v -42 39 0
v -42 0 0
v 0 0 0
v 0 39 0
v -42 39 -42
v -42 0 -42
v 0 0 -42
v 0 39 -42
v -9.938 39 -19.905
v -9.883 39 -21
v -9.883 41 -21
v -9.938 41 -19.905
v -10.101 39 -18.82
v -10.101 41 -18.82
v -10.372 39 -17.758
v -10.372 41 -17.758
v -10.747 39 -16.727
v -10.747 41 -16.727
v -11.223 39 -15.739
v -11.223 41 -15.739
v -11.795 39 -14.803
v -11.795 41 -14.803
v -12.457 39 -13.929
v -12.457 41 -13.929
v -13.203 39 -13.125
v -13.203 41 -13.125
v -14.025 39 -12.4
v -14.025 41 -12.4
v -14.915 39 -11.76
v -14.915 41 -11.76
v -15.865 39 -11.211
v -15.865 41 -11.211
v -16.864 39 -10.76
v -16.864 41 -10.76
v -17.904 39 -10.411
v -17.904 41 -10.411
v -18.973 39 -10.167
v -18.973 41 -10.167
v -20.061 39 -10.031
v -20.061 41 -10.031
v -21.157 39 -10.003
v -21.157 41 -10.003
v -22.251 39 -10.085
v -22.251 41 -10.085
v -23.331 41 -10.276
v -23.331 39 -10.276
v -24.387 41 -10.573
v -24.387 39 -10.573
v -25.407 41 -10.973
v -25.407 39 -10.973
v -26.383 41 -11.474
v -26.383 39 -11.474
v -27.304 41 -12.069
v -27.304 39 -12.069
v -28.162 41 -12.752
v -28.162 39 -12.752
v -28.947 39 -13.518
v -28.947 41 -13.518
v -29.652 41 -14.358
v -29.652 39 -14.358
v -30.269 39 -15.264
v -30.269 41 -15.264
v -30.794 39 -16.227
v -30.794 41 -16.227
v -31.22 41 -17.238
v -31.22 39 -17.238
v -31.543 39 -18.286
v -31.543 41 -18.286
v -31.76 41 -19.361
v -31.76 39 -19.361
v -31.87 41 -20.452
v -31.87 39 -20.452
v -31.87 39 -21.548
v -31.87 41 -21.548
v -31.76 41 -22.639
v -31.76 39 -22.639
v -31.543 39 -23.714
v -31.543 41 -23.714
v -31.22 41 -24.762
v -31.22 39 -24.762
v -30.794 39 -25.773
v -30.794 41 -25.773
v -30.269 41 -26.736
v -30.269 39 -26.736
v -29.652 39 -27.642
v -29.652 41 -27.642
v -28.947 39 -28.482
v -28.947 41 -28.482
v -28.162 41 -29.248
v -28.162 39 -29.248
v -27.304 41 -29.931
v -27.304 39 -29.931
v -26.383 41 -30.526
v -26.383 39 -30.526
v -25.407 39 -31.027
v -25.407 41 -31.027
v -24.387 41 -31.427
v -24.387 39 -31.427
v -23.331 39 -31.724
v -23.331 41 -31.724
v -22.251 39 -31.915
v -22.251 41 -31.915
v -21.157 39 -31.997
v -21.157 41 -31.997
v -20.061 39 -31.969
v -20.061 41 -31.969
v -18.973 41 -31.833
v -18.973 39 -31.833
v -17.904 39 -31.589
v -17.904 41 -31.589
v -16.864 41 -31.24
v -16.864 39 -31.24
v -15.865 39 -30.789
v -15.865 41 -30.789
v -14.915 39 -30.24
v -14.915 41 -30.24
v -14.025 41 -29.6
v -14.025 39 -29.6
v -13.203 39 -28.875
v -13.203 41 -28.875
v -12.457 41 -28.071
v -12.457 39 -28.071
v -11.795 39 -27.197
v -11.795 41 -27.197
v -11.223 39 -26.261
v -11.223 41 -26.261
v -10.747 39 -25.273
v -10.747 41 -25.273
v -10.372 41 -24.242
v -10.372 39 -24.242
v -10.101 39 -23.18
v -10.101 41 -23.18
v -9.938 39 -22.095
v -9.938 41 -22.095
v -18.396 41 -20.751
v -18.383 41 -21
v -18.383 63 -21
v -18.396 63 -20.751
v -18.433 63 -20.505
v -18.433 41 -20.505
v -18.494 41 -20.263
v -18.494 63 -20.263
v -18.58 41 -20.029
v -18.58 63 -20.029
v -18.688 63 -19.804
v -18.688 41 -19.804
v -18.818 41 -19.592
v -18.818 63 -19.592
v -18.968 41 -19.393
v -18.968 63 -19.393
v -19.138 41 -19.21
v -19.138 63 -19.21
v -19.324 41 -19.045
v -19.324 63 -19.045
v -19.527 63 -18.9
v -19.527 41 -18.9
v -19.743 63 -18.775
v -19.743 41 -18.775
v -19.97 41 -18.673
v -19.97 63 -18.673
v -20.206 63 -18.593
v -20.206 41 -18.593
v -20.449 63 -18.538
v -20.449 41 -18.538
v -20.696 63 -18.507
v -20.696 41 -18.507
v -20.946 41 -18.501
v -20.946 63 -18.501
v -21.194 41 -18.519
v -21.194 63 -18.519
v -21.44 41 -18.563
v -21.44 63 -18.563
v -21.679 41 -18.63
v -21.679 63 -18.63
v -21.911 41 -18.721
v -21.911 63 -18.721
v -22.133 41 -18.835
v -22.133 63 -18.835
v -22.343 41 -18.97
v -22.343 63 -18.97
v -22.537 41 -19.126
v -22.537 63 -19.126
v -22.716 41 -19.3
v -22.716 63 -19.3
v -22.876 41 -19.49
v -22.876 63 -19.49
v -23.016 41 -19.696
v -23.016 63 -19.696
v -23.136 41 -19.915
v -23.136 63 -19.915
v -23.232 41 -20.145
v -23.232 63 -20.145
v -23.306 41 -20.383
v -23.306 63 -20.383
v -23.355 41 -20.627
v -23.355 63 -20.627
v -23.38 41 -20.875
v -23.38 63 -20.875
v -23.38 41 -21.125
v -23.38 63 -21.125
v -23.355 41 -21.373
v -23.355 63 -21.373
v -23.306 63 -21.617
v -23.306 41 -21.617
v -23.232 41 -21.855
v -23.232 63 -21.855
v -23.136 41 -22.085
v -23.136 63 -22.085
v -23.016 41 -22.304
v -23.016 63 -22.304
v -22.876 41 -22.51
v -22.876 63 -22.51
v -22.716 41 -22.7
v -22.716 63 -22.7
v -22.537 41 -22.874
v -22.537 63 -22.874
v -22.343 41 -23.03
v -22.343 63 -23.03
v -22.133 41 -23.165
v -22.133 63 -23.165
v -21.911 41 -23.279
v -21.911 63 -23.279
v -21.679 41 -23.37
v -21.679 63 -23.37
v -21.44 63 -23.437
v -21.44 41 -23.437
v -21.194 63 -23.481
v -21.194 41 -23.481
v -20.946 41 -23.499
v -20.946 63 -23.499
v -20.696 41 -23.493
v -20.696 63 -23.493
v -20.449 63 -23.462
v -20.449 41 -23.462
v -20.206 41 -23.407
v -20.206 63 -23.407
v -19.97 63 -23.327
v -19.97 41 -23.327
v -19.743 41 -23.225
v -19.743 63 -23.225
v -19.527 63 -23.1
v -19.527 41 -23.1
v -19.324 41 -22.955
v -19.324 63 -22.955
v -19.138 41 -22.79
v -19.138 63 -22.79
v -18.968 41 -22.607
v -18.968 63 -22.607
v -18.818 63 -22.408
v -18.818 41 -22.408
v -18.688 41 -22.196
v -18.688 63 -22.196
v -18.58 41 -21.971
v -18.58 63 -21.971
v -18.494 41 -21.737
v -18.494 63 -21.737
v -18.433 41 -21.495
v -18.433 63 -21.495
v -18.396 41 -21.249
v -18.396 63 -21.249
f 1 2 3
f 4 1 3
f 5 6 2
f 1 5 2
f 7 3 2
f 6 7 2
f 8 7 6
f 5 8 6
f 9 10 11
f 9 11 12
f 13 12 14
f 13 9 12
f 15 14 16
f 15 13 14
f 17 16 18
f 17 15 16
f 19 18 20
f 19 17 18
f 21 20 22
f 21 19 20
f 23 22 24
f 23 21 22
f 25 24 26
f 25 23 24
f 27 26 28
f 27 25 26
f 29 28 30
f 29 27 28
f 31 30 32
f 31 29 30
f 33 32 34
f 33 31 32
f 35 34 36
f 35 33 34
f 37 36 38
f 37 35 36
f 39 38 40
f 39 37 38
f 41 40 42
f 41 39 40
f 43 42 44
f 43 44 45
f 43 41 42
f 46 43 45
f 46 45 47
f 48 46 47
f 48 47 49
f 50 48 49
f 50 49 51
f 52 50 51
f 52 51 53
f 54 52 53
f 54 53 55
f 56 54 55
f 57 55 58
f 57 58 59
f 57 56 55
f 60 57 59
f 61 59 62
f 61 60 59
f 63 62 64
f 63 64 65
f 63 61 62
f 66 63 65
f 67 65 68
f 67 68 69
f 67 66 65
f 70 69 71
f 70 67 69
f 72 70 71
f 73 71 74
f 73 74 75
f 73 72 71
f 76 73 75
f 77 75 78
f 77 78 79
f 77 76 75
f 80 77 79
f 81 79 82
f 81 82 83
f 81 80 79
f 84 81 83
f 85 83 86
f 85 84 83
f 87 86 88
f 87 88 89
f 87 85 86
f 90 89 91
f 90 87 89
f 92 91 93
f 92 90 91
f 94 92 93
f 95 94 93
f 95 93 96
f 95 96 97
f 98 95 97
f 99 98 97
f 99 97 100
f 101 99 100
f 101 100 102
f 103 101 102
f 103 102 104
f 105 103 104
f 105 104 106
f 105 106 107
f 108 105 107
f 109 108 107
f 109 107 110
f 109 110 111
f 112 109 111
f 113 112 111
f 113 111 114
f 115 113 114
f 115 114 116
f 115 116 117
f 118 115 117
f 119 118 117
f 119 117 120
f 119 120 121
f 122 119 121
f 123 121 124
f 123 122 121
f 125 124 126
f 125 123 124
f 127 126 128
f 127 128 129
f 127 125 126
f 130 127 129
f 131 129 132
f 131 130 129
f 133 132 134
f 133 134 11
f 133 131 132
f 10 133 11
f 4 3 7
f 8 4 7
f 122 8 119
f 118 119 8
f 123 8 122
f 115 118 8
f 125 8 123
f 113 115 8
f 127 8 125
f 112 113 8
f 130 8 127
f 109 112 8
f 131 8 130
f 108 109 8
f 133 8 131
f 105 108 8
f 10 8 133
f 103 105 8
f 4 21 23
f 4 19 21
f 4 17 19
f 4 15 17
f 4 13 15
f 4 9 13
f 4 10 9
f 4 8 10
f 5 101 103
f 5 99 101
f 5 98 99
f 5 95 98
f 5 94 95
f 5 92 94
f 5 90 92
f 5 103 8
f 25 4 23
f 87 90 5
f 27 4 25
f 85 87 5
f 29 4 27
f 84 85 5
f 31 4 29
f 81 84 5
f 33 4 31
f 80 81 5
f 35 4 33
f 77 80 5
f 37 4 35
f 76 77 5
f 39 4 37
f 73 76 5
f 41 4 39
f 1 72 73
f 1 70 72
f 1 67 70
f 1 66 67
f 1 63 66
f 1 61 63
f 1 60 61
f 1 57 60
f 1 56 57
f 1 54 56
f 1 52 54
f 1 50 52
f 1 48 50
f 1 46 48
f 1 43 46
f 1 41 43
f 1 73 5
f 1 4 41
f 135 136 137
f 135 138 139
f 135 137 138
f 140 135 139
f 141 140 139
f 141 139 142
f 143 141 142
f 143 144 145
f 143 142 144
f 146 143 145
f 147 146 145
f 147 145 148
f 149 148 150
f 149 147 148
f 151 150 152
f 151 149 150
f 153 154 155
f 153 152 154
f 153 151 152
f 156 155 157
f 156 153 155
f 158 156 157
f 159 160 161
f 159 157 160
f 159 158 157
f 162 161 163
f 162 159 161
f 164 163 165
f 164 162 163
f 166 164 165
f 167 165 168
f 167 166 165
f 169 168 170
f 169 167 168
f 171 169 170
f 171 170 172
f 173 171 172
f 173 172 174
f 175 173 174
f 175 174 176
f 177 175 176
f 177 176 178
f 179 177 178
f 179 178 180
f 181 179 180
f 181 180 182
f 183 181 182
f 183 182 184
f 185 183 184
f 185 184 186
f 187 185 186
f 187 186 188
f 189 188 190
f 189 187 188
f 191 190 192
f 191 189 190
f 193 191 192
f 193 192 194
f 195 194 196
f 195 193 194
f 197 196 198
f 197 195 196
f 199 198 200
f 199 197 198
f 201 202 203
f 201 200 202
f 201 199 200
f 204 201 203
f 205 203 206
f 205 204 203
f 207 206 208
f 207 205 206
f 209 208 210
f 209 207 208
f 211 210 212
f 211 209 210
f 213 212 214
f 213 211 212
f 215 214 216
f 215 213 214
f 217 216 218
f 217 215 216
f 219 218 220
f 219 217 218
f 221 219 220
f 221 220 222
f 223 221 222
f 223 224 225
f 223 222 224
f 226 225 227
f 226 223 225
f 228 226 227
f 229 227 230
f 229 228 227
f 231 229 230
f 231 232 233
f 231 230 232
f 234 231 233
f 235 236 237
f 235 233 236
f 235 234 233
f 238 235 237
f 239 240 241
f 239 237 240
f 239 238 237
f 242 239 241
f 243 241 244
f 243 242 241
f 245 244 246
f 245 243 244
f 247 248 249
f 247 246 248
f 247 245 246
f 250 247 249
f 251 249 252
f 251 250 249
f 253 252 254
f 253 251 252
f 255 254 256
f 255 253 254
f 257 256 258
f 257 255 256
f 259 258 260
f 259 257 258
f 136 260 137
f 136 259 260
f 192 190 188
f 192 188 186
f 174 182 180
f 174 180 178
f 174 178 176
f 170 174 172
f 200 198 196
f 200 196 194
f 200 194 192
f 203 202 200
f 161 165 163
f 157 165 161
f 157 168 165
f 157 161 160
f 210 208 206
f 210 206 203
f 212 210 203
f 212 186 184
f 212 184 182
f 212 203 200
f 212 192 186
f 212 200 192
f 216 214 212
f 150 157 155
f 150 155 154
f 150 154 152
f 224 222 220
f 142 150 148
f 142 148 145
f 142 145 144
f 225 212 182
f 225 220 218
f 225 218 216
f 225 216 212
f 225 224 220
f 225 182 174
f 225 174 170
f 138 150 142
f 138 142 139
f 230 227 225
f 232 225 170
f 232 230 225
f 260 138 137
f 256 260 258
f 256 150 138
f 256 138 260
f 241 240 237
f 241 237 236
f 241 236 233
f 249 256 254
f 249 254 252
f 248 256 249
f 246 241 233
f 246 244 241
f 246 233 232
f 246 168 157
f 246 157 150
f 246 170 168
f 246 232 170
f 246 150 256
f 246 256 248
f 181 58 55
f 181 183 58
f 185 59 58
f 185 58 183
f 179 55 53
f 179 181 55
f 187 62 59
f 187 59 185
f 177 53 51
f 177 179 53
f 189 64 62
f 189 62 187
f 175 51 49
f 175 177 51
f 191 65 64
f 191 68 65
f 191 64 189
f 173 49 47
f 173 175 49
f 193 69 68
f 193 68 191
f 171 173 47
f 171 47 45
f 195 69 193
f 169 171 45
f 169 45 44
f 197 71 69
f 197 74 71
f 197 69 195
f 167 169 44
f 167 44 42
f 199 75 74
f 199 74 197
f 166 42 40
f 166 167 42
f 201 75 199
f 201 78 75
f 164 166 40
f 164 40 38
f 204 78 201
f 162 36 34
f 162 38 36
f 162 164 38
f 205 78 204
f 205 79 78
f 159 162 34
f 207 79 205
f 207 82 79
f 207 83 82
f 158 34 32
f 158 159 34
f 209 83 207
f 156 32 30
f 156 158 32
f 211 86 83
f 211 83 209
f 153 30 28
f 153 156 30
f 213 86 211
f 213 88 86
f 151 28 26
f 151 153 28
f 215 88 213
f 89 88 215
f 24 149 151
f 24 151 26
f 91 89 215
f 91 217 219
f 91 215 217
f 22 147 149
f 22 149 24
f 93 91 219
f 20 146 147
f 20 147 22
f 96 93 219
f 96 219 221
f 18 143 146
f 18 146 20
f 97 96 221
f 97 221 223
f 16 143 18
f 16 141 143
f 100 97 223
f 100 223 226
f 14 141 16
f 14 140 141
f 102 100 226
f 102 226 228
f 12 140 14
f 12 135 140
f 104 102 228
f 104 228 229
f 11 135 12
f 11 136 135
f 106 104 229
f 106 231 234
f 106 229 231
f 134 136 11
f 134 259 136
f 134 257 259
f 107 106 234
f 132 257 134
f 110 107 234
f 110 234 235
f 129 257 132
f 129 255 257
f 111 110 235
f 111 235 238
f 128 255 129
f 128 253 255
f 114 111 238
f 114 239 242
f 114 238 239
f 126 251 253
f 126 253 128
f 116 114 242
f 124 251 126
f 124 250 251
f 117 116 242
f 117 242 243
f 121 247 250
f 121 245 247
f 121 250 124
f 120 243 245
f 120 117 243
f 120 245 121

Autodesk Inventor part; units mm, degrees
ref_plane "YZ Plane" through (0, 0, 0) normal (1, 0, 0) x (0, 1, 0)
ref_plane "XZ Plane" through (0, 0, 0) normal (0, 1, 0) x (-1, 0, 0)
ref_plane "XY Plane" through (0, 0, 0) normal (0, 0, 1) x (1, 0, 0)
sketch "Sketch1" plane through (0, 0, 0) normal (0, 1, 0) x (-1, 0, 0)
  line L0 (0, 0) -> (0, -42)
  line L1 (0, -42) -> (42, -42)
  line L2 (42, -42) -> (42, 0)
  line L3 (42, 0) -> (0, 0)
  line L4 (0, 0) -> (42, 0)
  dimension "d0" = 42
  dimension "d1" = 42
extrude "Extrusion1" add sketch "Sketch1" along normal blind 39
sketch "Sketch2" plane through (0, 39, 0) normal (0, 1, 0) x (1, 0, 0)
  line L0 (0, 0) -> (0, 42) projected
  line L1 (-41.7664, 0) -> (0, 42)
  circle A0 centre (-20.8832, 21) radius 11
  dimension "d4" = 22
extrude "Extrusion2" add sketch "Sketch2" along normal blind 2
sketch "Sketch3" plane through (-20.8832, 41, -21) normal (0, 1, 0) x (1, 0, 0)
  circle A0 centre (0, 0) radius 2.5
  point P0 (20.8832, -21)
  dimension "d7" = 5
extrude "Extrusion3" add sketch "Sketch3" along normal blind 22
properties part number "motor"
